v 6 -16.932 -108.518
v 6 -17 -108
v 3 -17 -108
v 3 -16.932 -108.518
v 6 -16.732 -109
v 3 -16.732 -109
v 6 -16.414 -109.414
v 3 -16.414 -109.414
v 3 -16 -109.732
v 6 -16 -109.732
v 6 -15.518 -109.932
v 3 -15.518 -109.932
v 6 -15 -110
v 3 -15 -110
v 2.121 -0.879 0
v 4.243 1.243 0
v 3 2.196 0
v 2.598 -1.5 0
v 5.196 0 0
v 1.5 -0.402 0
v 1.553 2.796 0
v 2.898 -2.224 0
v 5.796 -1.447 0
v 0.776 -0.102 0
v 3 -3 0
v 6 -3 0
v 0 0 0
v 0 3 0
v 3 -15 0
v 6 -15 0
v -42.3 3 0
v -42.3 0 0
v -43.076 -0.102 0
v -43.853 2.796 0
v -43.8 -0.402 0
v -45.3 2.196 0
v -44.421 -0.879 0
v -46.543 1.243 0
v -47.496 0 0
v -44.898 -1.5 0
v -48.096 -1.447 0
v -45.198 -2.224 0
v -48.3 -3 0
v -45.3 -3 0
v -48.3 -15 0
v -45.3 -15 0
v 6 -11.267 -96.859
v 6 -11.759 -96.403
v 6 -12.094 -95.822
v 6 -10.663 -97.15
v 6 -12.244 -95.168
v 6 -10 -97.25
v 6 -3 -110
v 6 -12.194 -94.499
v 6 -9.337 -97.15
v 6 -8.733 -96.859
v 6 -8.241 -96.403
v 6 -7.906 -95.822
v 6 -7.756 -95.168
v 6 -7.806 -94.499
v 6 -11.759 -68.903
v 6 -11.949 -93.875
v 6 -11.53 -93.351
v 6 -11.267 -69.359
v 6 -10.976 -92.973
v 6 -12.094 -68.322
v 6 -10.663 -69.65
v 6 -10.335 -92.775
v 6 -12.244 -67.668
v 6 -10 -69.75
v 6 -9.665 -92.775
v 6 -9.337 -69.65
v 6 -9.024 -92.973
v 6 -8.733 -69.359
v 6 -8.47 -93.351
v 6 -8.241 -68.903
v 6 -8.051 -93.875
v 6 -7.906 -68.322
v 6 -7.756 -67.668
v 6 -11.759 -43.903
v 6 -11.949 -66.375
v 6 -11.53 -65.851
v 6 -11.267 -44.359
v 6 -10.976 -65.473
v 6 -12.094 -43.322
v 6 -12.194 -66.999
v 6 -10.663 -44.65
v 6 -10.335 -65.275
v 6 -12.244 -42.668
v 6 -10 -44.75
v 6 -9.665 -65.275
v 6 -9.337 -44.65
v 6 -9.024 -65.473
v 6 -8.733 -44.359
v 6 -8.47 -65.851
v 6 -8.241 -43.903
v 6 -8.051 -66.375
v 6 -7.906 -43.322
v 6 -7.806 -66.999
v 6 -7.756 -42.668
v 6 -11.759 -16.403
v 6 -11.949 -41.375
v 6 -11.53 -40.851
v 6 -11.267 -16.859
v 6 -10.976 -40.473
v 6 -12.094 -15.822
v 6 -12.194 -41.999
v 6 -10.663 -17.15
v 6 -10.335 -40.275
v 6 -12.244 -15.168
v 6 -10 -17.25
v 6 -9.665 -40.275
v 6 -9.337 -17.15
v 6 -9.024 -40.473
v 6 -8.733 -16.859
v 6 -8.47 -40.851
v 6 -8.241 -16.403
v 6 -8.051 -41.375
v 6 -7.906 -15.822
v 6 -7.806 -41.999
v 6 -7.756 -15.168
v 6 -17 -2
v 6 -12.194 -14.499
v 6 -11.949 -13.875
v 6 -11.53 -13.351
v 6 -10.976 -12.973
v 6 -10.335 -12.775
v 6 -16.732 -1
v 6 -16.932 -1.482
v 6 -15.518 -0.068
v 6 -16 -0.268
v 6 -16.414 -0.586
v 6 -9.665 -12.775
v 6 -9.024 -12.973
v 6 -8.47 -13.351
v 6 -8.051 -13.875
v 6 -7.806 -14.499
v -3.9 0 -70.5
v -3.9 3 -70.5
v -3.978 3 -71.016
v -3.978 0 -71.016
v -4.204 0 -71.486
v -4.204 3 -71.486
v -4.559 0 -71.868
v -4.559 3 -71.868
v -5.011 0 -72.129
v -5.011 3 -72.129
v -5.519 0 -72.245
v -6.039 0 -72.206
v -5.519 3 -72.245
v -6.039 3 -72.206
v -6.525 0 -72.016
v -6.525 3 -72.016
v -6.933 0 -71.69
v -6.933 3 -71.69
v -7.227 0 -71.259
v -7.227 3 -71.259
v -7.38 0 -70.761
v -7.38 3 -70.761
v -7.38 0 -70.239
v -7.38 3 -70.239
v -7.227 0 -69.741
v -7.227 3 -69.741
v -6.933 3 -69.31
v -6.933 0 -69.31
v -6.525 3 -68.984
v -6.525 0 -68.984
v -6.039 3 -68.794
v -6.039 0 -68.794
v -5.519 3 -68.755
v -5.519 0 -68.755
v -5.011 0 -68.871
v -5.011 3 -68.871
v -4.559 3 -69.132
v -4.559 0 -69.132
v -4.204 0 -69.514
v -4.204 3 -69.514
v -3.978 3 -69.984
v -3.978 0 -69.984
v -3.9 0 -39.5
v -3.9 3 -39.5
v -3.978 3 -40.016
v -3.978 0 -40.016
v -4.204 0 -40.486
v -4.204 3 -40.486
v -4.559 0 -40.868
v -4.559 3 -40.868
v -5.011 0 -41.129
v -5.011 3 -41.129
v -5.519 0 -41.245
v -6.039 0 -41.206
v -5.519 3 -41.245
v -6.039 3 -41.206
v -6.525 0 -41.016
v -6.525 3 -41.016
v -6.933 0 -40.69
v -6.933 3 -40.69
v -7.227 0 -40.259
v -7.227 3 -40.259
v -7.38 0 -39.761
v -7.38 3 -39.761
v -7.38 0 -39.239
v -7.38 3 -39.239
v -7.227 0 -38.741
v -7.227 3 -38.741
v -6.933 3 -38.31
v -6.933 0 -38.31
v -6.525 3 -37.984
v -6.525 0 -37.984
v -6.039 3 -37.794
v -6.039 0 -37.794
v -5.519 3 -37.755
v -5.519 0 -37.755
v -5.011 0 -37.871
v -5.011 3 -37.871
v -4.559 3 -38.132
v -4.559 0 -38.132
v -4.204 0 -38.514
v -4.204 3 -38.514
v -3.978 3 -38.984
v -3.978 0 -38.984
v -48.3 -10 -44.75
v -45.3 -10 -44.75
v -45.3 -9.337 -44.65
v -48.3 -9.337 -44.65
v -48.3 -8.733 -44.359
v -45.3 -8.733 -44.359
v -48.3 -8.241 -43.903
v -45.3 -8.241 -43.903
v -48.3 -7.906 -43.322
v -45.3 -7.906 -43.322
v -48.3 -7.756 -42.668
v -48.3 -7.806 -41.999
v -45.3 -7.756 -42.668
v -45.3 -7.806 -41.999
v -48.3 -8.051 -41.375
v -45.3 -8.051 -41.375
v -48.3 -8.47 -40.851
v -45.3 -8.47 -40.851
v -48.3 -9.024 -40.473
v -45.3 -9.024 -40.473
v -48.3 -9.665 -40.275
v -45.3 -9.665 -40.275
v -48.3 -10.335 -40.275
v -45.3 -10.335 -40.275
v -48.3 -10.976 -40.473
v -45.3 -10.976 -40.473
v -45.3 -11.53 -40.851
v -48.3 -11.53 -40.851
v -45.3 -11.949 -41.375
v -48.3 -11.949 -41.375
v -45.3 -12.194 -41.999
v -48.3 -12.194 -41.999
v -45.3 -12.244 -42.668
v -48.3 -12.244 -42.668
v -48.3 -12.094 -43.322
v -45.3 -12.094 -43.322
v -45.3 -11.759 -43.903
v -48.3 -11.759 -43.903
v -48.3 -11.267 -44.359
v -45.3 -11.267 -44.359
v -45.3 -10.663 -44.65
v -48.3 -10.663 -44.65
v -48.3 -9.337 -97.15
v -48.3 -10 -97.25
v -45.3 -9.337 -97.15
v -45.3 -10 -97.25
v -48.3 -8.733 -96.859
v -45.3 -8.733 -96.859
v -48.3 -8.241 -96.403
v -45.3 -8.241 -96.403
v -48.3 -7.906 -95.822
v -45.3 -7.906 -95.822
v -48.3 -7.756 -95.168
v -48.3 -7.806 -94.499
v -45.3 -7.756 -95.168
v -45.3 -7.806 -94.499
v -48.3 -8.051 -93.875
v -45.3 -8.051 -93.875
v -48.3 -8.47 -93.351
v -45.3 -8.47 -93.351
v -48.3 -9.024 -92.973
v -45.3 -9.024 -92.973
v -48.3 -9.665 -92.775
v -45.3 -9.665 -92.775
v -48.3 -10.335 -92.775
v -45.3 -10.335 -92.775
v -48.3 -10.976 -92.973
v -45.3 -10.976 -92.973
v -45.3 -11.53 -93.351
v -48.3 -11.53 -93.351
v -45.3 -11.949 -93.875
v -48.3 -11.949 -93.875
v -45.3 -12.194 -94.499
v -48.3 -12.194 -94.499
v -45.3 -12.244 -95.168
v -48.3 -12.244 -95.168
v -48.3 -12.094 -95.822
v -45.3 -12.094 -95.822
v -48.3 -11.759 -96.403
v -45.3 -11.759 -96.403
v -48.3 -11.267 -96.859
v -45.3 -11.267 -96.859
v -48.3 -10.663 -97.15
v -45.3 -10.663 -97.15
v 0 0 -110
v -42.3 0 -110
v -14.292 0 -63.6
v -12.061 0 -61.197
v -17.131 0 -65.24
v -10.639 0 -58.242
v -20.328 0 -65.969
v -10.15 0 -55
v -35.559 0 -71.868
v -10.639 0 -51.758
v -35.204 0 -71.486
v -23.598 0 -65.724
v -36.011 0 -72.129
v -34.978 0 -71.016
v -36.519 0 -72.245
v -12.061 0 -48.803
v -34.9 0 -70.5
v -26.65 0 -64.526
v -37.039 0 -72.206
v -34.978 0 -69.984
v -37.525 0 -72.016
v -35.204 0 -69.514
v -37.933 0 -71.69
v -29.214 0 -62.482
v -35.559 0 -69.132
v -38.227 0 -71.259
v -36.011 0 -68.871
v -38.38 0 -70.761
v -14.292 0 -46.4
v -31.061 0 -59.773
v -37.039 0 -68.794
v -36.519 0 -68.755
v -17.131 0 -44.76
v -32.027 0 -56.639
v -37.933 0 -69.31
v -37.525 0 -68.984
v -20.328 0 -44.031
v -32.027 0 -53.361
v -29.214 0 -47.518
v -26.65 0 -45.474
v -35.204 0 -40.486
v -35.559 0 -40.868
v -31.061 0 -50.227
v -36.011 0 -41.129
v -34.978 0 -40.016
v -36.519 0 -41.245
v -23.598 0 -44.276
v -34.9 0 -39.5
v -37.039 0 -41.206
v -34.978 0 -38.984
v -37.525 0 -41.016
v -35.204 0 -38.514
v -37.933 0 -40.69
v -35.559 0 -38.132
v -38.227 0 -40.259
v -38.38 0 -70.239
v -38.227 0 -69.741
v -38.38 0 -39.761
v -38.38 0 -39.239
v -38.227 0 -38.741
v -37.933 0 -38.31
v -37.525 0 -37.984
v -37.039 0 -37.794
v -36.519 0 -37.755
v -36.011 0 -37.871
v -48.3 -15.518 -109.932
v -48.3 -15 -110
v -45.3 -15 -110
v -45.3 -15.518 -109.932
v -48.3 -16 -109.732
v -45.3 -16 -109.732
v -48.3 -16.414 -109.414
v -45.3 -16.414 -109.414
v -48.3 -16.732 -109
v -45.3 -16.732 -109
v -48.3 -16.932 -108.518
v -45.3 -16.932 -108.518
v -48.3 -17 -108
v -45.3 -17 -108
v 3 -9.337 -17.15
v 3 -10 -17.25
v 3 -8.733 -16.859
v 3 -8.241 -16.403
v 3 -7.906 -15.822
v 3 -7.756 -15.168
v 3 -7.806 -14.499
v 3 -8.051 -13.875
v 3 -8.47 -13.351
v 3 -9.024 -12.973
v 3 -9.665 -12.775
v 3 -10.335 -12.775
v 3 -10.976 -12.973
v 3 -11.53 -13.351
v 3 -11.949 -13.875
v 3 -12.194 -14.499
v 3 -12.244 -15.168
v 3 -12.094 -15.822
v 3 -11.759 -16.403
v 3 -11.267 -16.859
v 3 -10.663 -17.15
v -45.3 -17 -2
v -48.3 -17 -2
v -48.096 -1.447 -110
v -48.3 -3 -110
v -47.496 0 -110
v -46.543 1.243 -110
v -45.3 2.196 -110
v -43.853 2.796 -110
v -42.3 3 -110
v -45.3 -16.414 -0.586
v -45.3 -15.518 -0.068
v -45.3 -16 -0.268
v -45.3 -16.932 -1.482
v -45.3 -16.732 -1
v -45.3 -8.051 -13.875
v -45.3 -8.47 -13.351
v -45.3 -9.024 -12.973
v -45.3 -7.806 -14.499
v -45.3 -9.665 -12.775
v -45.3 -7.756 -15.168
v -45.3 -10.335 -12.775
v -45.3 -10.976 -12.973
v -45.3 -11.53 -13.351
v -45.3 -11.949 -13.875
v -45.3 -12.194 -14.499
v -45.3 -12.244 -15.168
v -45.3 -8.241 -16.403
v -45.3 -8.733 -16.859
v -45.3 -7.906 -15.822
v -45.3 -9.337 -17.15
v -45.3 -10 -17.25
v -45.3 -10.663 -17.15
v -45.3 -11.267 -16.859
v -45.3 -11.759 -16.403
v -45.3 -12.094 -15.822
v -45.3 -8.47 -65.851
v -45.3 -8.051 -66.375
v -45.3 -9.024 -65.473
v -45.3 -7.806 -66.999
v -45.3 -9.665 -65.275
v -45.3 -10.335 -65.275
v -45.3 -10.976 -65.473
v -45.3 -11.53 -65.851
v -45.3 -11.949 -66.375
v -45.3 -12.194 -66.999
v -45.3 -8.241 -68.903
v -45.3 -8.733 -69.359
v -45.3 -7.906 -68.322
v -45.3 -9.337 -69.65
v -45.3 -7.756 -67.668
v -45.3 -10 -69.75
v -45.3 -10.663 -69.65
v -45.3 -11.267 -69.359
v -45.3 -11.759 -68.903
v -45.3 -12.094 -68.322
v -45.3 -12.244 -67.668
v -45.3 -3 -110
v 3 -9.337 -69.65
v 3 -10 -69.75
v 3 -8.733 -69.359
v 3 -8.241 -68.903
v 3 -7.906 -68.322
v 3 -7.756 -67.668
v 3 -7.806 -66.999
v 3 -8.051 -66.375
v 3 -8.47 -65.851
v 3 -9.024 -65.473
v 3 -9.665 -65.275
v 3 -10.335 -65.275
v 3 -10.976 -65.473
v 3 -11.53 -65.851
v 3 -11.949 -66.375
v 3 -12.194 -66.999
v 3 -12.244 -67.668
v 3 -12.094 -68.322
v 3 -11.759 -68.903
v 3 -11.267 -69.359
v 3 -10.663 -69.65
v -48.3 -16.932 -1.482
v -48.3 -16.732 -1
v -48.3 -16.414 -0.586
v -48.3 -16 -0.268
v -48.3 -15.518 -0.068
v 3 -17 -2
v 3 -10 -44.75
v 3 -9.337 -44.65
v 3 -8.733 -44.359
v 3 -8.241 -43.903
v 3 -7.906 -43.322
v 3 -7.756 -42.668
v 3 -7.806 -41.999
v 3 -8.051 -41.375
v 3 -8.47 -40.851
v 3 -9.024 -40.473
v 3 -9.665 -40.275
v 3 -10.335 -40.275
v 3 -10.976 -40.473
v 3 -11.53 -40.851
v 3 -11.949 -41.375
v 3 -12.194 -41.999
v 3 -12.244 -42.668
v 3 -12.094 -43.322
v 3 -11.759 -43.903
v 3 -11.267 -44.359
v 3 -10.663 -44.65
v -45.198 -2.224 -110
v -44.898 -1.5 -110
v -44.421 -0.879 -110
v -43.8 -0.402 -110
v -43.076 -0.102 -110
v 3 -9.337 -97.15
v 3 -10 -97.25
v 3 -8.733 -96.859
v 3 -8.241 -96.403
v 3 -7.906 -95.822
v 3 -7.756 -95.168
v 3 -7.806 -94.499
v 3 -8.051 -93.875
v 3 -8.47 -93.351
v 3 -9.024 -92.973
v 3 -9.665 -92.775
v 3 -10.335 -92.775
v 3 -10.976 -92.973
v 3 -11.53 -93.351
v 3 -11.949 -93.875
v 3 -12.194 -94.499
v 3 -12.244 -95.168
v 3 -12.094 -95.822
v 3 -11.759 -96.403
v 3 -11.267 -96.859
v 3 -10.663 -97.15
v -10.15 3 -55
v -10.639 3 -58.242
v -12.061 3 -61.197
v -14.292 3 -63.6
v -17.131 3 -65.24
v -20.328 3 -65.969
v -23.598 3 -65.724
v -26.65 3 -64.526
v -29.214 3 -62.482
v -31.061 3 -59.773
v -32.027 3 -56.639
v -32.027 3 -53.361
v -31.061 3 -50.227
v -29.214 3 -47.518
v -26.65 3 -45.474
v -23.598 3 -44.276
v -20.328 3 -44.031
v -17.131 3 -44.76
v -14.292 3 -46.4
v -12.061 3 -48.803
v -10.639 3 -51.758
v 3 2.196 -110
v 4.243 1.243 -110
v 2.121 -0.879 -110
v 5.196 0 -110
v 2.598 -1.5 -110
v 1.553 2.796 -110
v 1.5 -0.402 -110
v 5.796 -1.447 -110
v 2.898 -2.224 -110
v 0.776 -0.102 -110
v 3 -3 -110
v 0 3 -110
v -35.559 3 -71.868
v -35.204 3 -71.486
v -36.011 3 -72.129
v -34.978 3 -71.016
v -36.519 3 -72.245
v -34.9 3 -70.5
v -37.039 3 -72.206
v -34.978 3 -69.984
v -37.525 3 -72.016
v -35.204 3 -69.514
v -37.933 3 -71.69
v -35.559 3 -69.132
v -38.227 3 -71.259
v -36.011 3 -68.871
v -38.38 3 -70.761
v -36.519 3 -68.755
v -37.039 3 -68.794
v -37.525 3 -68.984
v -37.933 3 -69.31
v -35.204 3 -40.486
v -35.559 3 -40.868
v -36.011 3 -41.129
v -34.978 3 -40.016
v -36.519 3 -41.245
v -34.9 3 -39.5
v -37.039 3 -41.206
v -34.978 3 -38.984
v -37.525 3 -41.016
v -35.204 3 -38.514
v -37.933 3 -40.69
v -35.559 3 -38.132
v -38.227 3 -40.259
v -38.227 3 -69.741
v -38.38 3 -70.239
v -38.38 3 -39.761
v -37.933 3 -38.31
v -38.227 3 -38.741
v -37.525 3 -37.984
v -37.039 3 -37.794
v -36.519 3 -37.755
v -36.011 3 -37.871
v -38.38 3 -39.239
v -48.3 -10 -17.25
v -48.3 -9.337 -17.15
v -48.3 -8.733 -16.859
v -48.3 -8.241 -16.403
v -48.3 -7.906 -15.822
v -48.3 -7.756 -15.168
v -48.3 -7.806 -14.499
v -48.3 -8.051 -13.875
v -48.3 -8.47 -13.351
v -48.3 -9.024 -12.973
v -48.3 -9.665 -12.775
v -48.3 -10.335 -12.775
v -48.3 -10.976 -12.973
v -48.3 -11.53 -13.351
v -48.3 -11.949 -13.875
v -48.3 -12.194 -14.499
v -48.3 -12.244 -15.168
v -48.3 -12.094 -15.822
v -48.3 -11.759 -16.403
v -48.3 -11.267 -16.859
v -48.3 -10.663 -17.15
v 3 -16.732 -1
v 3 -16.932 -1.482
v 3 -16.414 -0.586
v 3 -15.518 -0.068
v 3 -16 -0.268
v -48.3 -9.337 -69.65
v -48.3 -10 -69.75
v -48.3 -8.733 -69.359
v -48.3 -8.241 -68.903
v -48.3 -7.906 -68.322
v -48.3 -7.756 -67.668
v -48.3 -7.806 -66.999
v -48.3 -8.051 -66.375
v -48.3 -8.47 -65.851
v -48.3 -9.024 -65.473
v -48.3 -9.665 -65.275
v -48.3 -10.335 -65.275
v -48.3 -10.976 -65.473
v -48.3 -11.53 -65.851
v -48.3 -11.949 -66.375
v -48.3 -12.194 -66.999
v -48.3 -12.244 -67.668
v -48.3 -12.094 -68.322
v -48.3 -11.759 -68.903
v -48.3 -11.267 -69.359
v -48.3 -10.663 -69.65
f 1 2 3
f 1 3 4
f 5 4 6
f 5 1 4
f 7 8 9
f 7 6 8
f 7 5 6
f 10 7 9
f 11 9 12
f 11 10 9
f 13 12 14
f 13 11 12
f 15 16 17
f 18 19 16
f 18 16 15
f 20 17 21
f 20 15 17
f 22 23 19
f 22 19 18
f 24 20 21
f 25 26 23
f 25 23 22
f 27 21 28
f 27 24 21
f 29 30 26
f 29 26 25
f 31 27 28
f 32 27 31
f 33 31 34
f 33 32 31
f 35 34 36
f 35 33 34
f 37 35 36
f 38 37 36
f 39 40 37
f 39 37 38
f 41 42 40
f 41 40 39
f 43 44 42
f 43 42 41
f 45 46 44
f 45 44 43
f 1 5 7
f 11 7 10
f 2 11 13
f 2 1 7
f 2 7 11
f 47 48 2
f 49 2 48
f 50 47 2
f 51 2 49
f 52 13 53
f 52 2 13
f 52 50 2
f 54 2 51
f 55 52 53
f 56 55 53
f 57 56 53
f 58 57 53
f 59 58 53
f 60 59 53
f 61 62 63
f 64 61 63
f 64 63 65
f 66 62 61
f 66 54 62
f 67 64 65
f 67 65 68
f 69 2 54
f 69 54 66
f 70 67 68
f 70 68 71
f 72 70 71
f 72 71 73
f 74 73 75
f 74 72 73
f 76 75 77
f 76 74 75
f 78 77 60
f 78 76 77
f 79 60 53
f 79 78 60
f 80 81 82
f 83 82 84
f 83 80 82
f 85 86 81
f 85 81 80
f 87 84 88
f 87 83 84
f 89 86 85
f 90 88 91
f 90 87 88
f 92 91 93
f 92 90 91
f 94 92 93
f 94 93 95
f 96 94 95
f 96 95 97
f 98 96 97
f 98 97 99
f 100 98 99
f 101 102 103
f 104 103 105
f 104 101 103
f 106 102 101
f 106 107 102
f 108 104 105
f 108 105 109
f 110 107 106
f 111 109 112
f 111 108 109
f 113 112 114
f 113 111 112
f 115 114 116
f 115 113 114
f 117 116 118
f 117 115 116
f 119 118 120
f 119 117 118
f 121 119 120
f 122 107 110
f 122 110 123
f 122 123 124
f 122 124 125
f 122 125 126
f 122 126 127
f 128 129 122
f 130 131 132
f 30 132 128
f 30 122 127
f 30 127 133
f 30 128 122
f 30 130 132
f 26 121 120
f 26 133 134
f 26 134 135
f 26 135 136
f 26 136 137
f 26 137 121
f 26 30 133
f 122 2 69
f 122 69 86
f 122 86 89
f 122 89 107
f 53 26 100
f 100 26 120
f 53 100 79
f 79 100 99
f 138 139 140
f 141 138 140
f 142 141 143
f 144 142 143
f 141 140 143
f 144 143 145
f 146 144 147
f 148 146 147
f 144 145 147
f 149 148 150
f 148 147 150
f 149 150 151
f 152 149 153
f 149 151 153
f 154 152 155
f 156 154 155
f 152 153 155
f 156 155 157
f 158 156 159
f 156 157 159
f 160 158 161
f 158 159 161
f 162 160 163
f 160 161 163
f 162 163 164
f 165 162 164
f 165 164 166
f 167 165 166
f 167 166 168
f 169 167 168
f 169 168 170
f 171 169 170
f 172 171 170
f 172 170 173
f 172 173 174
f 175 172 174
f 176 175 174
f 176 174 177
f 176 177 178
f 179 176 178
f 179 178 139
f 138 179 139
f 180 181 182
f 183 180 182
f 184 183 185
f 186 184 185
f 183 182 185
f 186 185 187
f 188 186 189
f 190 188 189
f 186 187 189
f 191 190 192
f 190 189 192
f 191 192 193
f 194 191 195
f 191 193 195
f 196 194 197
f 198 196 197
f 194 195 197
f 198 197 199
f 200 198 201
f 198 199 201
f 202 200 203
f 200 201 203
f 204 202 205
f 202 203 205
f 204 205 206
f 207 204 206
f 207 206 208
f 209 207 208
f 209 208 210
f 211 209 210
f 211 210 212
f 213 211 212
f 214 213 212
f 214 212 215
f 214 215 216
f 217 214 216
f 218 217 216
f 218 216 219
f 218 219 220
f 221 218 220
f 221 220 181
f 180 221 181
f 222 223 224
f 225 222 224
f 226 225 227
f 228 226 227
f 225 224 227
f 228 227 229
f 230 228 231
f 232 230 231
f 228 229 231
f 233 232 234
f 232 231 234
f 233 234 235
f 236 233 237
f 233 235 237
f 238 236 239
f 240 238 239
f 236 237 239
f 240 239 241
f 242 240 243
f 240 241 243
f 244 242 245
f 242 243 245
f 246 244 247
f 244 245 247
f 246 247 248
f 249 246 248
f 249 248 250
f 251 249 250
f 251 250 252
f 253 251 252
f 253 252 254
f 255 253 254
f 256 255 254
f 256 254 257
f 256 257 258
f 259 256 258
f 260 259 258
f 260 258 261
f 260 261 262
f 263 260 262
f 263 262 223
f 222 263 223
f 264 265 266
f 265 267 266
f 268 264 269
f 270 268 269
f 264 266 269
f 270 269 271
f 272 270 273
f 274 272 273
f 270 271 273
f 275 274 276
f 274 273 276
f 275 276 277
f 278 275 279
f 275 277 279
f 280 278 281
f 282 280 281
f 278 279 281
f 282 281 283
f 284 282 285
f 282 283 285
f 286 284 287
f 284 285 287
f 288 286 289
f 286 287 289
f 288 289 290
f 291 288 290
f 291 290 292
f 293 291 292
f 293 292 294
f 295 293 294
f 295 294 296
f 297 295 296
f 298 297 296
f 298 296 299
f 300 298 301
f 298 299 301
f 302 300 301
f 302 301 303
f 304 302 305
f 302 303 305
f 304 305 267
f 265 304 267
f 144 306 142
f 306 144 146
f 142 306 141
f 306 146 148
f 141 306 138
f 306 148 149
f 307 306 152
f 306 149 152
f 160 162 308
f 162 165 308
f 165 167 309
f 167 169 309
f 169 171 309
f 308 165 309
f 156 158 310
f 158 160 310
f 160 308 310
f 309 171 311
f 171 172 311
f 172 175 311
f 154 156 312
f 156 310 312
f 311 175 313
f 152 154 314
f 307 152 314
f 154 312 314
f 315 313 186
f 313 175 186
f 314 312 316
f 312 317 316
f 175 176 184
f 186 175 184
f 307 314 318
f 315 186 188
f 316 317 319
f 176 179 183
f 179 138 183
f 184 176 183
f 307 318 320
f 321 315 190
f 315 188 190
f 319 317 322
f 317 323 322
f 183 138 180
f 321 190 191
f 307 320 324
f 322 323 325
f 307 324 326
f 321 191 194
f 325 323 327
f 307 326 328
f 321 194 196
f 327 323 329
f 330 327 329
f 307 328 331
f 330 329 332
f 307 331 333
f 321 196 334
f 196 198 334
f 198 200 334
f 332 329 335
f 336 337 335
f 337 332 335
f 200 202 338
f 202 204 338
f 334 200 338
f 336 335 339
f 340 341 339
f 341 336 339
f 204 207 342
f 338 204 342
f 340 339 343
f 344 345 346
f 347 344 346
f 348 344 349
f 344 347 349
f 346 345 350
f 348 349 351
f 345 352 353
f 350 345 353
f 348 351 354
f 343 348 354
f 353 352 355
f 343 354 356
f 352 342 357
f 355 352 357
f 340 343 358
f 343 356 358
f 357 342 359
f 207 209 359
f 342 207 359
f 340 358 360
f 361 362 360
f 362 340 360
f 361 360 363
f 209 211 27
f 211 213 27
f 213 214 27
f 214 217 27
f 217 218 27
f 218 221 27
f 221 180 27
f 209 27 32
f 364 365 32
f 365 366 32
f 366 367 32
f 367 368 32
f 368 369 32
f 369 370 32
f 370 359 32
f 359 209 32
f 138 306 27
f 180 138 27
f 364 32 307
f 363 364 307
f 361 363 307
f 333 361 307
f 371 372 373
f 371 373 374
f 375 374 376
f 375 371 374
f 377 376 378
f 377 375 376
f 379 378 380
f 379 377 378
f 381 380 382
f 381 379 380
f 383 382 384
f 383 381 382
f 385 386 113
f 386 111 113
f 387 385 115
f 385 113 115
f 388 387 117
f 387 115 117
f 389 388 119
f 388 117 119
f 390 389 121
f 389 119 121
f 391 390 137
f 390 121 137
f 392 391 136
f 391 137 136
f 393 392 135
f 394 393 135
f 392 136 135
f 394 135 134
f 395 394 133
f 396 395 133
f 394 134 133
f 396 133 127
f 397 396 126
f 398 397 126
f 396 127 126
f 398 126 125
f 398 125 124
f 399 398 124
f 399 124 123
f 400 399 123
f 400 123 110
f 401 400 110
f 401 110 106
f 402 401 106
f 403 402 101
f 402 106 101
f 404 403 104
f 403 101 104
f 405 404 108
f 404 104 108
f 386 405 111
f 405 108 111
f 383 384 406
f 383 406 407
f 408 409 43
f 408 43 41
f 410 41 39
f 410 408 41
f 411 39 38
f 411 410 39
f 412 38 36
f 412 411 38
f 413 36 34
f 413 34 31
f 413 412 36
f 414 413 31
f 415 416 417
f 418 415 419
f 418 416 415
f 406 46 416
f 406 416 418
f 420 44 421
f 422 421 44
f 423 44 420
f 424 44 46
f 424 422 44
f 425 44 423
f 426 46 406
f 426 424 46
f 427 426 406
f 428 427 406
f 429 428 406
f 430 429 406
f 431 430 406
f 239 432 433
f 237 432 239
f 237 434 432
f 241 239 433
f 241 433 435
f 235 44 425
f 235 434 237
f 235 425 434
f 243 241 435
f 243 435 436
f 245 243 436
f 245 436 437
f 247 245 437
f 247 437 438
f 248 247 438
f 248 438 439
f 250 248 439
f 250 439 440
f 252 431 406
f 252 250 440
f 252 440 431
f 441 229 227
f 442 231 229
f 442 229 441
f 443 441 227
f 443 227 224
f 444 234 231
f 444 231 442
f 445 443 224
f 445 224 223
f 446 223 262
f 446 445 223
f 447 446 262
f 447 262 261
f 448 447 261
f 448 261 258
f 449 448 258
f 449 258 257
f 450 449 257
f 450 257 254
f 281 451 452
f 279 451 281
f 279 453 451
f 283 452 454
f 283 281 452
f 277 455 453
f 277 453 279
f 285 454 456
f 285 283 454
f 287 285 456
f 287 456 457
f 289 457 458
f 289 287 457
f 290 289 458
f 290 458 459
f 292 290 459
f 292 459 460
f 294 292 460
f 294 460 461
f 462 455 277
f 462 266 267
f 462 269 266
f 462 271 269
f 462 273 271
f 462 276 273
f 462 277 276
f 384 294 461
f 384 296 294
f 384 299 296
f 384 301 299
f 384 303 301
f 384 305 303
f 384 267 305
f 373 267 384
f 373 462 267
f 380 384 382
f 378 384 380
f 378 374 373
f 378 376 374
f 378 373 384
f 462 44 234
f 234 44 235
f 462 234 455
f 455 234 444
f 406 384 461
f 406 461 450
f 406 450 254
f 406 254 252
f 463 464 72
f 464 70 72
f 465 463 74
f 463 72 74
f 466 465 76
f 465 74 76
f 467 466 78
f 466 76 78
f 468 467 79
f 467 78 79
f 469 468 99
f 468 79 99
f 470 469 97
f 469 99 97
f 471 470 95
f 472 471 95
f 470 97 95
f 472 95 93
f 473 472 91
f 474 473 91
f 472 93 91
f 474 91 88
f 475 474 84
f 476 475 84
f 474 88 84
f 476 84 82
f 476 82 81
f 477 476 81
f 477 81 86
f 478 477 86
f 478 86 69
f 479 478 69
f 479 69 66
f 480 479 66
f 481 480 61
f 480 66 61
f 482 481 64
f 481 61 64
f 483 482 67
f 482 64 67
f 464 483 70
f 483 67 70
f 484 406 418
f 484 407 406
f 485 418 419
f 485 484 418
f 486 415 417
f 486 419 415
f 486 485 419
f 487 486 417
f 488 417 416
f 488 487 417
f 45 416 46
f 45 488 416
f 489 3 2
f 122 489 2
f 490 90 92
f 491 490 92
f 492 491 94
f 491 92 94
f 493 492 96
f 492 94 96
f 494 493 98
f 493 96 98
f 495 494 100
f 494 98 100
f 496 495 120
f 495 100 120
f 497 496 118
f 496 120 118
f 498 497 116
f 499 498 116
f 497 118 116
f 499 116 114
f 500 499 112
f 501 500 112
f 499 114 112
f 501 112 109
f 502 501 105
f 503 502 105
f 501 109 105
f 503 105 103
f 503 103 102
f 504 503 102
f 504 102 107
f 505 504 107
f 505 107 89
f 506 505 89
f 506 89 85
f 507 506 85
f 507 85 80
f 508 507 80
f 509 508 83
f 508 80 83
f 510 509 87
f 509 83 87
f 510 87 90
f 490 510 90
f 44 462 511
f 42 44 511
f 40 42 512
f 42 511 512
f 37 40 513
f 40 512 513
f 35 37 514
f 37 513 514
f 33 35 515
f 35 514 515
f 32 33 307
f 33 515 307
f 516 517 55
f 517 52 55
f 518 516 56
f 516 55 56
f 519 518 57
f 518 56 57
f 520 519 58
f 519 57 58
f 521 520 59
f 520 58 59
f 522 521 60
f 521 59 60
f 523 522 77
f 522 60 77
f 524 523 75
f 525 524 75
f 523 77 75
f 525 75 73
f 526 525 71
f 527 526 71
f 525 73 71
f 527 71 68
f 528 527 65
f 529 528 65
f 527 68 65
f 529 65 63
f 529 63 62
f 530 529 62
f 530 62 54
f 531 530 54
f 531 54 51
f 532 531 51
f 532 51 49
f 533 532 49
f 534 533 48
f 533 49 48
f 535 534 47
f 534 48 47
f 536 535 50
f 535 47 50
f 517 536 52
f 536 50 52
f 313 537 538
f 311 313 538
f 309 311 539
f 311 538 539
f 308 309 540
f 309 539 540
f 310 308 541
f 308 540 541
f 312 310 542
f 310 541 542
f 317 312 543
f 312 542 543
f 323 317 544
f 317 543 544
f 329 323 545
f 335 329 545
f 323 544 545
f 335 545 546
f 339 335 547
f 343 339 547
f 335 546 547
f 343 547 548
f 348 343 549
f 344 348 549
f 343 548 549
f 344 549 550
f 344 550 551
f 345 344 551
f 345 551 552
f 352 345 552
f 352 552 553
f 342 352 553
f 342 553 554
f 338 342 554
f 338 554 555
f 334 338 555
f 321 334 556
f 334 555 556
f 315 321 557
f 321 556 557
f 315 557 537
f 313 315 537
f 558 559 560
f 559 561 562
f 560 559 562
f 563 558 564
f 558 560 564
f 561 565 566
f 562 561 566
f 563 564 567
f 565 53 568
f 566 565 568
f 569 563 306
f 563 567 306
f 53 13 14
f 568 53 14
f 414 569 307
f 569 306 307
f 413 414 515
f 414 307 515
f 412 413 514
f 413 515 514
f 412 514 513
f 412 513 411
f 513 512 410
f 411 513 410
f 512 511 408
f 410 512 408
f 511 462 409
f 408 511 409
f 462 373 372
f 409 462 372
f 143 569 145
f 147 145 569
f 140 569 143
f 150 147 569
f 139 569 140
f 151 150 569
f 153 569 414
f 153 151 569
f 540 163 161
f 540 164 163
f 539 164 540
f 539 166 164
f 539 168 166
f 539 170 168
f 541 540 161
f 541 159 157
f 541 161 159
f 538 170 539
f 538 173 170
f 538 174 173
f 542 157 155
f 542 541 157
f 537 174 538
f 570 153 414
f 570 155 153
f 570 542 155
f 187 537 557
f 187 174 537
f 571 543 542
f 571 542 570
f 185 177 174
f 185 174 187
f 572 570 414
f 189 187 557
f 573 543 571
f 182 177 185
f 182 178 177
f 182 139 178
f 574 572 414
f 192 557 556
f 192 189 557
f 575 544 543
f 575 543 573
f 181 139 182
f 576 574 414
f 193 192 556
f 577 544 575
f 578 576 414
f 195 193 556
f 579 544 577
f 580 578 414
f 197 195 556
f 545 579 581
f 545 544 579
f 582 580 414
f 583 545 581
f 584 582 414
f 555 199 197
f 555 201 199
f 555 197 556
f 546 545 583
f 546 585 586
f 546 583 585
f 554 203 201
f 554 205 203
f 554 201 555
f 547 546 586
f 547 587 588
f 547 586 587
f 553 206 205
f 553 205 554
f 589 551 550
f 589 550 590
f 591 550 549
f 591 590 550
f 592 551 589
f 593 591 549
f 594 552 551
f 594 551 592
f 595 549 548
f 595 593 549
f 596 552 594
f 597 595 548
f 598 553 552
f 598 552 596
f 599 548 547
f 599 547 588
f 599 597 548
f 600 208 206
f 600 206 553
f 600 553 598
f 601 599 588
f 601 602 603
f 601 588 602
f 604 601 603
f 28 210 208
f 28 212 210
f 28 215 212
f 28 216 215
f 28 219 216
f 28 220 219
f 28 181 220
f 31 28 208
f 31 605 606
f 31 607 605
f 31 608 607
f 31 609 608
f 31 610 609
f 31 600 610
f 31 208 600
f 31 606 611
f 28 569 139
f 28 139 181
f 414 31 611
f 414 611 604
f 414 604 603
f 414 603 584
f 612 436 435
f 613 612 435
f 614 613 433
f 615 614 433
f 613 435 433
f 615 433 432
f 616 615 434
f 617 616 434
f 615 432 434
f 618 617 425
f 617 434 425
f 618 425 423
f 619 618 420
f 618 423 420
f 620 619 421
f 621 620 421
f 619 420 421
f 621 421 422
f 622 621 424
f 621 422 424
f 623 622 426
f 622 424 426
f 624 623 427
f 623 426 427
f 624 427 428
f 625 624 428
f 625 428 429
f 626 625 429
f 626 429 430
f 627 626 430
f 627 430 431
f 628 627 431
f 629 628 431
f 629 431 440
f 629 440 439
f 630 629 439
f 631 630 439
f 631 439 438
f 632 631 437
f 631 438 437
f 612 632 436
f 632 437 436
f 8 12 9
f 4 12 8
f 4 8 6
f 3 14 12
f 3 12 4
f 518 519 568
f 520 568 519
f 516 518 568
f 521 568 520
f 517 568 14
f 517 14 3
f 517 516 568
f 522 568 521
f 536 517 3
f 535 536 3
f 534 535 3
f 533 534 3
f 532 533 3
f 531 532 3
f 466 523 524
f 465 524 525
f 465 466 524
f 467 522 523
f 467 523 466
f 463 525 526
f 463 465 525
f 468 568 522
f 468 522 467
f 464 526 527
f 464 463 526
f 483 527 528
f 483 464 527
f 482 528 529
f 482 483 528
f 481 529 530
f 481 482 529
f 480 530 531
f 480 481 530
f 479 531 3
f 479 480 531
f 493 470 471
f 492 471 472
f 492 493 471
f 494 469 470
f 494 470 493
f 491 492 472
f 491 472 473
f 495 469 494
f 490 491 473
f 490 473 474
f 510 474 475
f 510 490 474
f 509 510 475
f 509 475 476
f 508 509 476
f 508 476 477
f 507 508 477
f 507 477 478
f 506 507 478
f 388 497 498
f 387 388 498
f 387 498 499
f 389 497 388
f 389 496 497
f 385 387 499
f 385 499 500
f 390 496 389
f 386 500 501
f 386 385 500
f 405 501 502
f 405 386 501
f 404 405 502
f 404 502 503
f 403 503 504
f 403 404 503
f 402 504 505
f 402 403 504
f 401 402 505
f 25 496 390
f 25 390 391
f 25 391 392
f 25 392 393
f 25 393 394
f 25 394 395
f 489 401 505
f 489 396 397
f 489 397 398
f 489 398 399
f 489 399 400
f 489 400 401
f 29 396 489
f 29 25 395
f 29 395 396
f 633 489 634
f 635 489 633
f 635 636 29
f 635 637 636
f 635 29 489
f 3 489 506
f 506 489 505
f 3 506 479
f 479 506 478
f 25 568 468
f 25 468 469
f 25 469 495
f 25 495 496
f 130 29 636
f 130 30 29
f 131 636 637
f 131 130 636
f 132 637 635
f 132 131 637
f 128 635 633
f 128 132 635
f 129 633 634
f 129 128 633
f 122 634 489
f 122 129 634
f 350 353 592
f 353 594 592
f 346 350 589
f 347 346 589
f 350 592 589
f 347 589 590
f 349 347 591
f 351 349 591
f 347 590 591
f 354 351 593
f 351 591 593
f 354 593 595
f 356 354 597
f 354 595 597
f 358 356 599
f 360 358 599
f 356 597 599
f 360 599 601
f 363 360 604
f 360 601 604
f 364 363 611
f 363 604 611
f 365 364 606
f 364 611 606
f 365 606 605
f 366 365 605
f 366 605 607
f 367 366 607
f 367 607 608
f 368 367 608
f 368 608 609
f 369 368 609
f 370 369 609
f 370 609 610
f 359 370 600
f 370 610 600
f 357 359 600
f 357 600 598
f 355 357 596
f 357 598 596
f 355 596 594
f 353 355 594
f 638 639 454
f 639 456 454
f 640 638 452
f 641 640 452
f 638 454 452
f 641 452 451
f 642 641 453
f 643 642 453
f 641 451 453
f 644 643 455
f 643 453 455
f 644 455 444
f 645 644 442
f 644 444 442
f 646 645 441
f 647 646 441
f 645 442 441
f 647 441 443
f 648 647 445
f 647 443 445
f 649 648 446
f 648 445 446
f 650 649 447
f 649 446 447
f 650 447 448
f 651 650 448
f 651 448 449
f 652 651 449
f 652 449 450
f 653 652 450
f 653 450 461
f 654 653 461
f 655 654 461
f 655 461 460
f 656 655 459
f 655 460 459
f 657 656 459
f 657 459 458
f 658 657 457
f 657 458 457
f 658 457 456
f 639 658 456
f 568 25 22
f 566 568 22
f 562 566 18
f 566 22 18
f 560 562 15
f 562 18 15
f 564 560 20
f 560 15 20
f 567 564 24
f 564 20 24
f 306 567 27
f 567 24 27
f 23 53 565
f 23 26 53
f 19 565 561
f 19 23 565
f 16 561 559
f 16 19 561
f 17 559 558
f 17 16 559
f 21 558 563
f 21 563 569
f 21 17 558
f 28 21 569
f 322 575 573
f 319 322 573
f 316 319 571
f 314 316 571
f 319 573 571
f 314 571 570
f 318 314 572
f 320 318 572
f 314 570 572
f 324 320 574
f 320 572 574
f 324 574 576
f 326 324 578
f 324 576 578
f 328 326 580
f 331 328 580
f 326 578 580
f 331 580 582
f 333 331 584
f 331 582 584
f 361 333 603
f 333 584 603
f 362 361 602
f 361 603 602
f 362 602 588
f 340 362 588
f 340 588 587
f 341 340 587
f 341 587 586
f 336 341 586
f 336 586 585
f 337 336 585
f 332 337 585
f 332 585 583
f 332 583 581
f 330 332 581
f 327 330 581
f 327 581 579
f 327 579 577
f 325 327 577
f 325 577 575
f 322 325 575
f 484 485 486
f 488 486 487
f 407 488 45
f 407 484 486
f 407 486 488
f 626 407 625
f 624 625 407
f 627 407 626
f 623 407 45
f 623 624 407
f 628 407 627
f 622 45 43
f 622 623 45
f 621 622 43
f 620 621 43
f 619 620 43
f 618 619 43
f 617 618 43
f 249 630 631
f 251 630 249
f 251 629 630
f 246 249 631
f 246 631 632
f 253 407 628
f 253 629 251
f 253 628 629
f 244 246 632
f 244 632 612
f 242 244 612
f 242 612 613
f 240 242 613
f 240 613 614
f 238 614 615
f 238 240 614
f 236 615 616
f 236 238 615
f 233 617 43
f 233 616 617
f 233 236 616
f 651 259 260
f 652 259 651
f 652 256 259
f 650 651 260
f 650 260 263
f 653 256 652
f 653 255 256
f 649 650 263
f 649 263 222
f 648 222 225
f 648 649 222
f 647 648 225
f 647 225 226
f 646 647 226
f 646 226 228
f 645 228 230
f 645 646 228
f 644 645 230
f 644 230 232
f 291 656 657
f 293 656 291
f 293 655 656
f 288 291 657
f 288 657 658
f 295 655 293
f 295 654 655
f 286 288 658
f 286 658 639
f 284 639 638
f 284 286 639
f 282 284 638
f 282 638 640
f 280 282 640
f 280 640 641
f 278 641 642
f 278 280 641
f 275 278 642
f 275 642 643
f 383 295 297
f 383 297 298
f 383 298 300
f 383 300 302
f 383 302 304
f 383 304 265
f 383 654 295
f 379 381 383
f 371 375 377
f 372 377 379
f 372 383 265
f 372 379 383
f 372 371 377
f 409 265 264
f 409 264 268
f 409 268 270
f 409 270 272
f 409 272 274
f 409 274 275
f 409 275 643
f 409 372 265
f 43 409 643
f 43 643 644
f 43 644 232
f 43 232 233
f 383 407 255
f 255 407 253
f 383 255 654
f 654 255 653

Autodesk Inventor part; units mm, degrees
ref_plane "YZ Plane" through (0, 0, 0) normal (1, 0, 0) x (0, 1, 0)
ref_plane "XZ Plane" through (0, 0, 0) normal (0, 1, 0) x (-1, 0, 0)
ref_plane "XY Plane" through (0, 0, 0) normal (0, 0, 1) x (1, 0, 0)
sketch "Skizze1" plane through (0, 0, 0) normal (0, 1, 0) x (-1, 0, 0)
  line L0 (42.3, 0) -> (0, 0)
  line L1 (0, 0) -> (0, -110)
  line L2 (0, -110) -> (42.3, -110)
  line L3 (42.3, -110) -> (42.3, 0)
  dimension "d0" = 110
  dimension "d1" = 42.3
extrude "Extrusion1" add sketch "Skizze1" along normal blind 3
sketch "Skizze2" plane through (0, 3, 0) normal (0, 1, 0) x (1, 0, 0)
  line L0 (-42.3, 110) -> (-42.3, 0) projected
  line L1 (-42.3, 55) -> (0, 55)
  line L2 (0, 0) -> (0, 110) projected
  line L3 (-42.3, 0) -> (0, 0) projected
  line L4 (-21.15, 0) -> (-21.15, 110)
  line L5 (0, 110) -> (-42.3, 110) projected
  circle A0 centre (-21.15, 55) radius 11
  line L6 (-22.1428, 55) -> (16.9767, 55)
  dimension "d4" = 22
extrude "Extrusion2" cut sketch "Skizze2" against normal blind 4 contours A0 L4 L1 | L1 L4 A0 | A0 L1 L4 | L4 L1 A0
sketch "Skizze3" plane through (0, 3, 0) normal (0, 1, 0) x (1, 0, 0)
  line L0 (-42.3, 110) -> (-42.3, 0) projected
  line L1 (0, 0) -> (0, 110) projected
  line L2 (-42.3, 0) -> (0, 0) projected
  line L3 (-21.15, 0) -> (-21.15, 110)
  line L4 (0, 110) -> (-42.3, 110) projected
  circle A0 centre (-21.15, 55) radius 21.9203 construction
  line L5 (-21.15, 55) -> (-36.65, 55) construction
  line L6 (-36.65, 39.5) -> (-36.65, 70.5) construction
  circle A1 centre (-36.65, 39.5) radius 1.75
  circle A2 centre (-36.65, 70.5) radius 1.75
  circle A3 centre (-5.65, 39.5) radius 1.75
  circle A4 centre (-5.65, 70.5) radius 1.75
  dimension "d7" = 15.5
  dimension "d8" = 31
  dimension "d9" = 3.5
  dimension "d10" = 3.5
extrude "Extrusion3" cut sketch "Skizze3" against normal blind 4 contours A1 | A2 | A3 | A4
sketch "Skizze4" plane through (-45.3, -3, -110) normal (-1, 0, 0) x (0, -1, 0)
  line L0 (0, 110) -> (0, 0)
  line L1 (0, 0) -> (14, 0)
  line L2 (14, 0) -> (14, 110)
  line L3 (14, 110) -> (0, 110)
edge flange "Lasche1" height 20 angle 90 thickness 3 bend radius 3 thickness toward (-1, 0, 0) relief tear relief width 3 relief depth 1.5 edges at (-42.3, 0, -55) wall of the first edge with corners at (-45.3, -3, 0) (-45.3, -3, -110) (-45.3, -17, -110) (-45.3, -17, 0)
bend "Biegung1"
corner "Ecke1"
sketch "Skizze5" plane through (3, -3, 0) normal (1, 0, 0) x (0, 1, 0)
  line L0 (0, -110) -> (0, 0)
  line L1 (0, 0) -> (-14, 0)
  line L2 (-14, 0) -> (-14, -110)
  line L3 (-14, -110) -> (0, -110)
edge flange "Lasche2" height 20 angle 90 thickness 3 bend radius 3 thickness toward (1, 0, 0) relief tear relief width 3 relief depth 1.5 edges at (0, 0, -55) wall of the first edge with corners at (3, -3, -110) (3, -3, 0) (3, -17, 0) (3, -17, -110)
bend "Biegung2"
corner "Ecke2"
sketch "Skizze6" plane through (6, -17, 0) normal (1, 0, 0) x (0, 0, -1)
  line L0 (0, 0) -> (0, 14) projected
  line L1 (0, 7) -> (110, 7)
  line L2 (110, 0) -> (110, 14) projected
  line L3 (110, 0) -> (0, 0) projected
  line L4 (55, 0) -> (55, 14)
  line L5 (0, 14) -> (110, 14) projected
  circle A0 centre (67.5, 7) radius 2.25
  circle A1 centre (42.5, 7) radius 2.25
  circle A2 centre (95, 7) radius 2.25
  circle A3 centre (15, 7) radius 2.25
  point P0 (0, 17)
  point P1 (17.25, 7)
  point P2 (12.75, 7)
  dimension "d35" = 4.5
  dimension "d36" = 4.5
  dimension "d37" = 25
  dimension "d41" = 4.5
  dimension "d42" = 4.5
  dimension "d43" = 80
fillet "Rundung2" radius 2 4 edges at (-46.8, -17, -110) (4.5, -17, -110) (-46.8, -17, 0) (4.5, -17, 0)
extrude "Extrusion5" cut sketch "Skizze6" against normal blind 100 contours A3 L1 | L1 A3 | A1 L1 | L1 A1 | A0 L1 | L1 A0 | A2 L1 | L1 A2
equation "\"d14\" = Stärke"
equation "\"d15\" = BreiteBiegungsfreistellung"
equation "\"d16\" = TiefeBiegungsfreistellung"
equation "\"d17\" = MinimalRest"
equation "\"d18\" = Übergangsradius"
equation "\"d21\" = Biegeradius"
equation "\"d22\" = GrößeEckenfreistellung"
equation "\"d23\" = Abstandsgröße"
equation "\"d24\" = JacobiRadiusGröße"
equation "\"d25\" = BreiteBiegungsfreistellung"
equation "\"d26\" = TiefeBiegungsfreistellung"
equation "\"d27\" = MinimalRest"
equation "\"d28\" = Übergangsradius"
equation "\"d31\" = Biegeradius"
equation "\"d32\" = GrößeEckenfreistellung"
equation "\"d33\" = Abstandsgröße"
equation "\"d34\" = JacobiRadiusGröße"
equation "\"Biegeradius\" = Stärke"
equation "\"BreiteBiegungsfreistellung\" = Stärke"
equation "\"TiefeBiegungsfreistellung\" = 0.5 * Stärke"
equation "\"GrößeEckenfreistellung\" = 4 * Stärke"
equation "\"MinimalRest\" = 2 * Stärke"
equation "\"Übergangsradius\" = Biegeradius"
equation "\"JacobiRadiusGröße\" = Biegeradius"
equation "\"Abstandsgröße\" = Stärke"
equation "\"Stärke\" = 3"
properties part number "Motorhalter_02" material "Aluminium 6061"
